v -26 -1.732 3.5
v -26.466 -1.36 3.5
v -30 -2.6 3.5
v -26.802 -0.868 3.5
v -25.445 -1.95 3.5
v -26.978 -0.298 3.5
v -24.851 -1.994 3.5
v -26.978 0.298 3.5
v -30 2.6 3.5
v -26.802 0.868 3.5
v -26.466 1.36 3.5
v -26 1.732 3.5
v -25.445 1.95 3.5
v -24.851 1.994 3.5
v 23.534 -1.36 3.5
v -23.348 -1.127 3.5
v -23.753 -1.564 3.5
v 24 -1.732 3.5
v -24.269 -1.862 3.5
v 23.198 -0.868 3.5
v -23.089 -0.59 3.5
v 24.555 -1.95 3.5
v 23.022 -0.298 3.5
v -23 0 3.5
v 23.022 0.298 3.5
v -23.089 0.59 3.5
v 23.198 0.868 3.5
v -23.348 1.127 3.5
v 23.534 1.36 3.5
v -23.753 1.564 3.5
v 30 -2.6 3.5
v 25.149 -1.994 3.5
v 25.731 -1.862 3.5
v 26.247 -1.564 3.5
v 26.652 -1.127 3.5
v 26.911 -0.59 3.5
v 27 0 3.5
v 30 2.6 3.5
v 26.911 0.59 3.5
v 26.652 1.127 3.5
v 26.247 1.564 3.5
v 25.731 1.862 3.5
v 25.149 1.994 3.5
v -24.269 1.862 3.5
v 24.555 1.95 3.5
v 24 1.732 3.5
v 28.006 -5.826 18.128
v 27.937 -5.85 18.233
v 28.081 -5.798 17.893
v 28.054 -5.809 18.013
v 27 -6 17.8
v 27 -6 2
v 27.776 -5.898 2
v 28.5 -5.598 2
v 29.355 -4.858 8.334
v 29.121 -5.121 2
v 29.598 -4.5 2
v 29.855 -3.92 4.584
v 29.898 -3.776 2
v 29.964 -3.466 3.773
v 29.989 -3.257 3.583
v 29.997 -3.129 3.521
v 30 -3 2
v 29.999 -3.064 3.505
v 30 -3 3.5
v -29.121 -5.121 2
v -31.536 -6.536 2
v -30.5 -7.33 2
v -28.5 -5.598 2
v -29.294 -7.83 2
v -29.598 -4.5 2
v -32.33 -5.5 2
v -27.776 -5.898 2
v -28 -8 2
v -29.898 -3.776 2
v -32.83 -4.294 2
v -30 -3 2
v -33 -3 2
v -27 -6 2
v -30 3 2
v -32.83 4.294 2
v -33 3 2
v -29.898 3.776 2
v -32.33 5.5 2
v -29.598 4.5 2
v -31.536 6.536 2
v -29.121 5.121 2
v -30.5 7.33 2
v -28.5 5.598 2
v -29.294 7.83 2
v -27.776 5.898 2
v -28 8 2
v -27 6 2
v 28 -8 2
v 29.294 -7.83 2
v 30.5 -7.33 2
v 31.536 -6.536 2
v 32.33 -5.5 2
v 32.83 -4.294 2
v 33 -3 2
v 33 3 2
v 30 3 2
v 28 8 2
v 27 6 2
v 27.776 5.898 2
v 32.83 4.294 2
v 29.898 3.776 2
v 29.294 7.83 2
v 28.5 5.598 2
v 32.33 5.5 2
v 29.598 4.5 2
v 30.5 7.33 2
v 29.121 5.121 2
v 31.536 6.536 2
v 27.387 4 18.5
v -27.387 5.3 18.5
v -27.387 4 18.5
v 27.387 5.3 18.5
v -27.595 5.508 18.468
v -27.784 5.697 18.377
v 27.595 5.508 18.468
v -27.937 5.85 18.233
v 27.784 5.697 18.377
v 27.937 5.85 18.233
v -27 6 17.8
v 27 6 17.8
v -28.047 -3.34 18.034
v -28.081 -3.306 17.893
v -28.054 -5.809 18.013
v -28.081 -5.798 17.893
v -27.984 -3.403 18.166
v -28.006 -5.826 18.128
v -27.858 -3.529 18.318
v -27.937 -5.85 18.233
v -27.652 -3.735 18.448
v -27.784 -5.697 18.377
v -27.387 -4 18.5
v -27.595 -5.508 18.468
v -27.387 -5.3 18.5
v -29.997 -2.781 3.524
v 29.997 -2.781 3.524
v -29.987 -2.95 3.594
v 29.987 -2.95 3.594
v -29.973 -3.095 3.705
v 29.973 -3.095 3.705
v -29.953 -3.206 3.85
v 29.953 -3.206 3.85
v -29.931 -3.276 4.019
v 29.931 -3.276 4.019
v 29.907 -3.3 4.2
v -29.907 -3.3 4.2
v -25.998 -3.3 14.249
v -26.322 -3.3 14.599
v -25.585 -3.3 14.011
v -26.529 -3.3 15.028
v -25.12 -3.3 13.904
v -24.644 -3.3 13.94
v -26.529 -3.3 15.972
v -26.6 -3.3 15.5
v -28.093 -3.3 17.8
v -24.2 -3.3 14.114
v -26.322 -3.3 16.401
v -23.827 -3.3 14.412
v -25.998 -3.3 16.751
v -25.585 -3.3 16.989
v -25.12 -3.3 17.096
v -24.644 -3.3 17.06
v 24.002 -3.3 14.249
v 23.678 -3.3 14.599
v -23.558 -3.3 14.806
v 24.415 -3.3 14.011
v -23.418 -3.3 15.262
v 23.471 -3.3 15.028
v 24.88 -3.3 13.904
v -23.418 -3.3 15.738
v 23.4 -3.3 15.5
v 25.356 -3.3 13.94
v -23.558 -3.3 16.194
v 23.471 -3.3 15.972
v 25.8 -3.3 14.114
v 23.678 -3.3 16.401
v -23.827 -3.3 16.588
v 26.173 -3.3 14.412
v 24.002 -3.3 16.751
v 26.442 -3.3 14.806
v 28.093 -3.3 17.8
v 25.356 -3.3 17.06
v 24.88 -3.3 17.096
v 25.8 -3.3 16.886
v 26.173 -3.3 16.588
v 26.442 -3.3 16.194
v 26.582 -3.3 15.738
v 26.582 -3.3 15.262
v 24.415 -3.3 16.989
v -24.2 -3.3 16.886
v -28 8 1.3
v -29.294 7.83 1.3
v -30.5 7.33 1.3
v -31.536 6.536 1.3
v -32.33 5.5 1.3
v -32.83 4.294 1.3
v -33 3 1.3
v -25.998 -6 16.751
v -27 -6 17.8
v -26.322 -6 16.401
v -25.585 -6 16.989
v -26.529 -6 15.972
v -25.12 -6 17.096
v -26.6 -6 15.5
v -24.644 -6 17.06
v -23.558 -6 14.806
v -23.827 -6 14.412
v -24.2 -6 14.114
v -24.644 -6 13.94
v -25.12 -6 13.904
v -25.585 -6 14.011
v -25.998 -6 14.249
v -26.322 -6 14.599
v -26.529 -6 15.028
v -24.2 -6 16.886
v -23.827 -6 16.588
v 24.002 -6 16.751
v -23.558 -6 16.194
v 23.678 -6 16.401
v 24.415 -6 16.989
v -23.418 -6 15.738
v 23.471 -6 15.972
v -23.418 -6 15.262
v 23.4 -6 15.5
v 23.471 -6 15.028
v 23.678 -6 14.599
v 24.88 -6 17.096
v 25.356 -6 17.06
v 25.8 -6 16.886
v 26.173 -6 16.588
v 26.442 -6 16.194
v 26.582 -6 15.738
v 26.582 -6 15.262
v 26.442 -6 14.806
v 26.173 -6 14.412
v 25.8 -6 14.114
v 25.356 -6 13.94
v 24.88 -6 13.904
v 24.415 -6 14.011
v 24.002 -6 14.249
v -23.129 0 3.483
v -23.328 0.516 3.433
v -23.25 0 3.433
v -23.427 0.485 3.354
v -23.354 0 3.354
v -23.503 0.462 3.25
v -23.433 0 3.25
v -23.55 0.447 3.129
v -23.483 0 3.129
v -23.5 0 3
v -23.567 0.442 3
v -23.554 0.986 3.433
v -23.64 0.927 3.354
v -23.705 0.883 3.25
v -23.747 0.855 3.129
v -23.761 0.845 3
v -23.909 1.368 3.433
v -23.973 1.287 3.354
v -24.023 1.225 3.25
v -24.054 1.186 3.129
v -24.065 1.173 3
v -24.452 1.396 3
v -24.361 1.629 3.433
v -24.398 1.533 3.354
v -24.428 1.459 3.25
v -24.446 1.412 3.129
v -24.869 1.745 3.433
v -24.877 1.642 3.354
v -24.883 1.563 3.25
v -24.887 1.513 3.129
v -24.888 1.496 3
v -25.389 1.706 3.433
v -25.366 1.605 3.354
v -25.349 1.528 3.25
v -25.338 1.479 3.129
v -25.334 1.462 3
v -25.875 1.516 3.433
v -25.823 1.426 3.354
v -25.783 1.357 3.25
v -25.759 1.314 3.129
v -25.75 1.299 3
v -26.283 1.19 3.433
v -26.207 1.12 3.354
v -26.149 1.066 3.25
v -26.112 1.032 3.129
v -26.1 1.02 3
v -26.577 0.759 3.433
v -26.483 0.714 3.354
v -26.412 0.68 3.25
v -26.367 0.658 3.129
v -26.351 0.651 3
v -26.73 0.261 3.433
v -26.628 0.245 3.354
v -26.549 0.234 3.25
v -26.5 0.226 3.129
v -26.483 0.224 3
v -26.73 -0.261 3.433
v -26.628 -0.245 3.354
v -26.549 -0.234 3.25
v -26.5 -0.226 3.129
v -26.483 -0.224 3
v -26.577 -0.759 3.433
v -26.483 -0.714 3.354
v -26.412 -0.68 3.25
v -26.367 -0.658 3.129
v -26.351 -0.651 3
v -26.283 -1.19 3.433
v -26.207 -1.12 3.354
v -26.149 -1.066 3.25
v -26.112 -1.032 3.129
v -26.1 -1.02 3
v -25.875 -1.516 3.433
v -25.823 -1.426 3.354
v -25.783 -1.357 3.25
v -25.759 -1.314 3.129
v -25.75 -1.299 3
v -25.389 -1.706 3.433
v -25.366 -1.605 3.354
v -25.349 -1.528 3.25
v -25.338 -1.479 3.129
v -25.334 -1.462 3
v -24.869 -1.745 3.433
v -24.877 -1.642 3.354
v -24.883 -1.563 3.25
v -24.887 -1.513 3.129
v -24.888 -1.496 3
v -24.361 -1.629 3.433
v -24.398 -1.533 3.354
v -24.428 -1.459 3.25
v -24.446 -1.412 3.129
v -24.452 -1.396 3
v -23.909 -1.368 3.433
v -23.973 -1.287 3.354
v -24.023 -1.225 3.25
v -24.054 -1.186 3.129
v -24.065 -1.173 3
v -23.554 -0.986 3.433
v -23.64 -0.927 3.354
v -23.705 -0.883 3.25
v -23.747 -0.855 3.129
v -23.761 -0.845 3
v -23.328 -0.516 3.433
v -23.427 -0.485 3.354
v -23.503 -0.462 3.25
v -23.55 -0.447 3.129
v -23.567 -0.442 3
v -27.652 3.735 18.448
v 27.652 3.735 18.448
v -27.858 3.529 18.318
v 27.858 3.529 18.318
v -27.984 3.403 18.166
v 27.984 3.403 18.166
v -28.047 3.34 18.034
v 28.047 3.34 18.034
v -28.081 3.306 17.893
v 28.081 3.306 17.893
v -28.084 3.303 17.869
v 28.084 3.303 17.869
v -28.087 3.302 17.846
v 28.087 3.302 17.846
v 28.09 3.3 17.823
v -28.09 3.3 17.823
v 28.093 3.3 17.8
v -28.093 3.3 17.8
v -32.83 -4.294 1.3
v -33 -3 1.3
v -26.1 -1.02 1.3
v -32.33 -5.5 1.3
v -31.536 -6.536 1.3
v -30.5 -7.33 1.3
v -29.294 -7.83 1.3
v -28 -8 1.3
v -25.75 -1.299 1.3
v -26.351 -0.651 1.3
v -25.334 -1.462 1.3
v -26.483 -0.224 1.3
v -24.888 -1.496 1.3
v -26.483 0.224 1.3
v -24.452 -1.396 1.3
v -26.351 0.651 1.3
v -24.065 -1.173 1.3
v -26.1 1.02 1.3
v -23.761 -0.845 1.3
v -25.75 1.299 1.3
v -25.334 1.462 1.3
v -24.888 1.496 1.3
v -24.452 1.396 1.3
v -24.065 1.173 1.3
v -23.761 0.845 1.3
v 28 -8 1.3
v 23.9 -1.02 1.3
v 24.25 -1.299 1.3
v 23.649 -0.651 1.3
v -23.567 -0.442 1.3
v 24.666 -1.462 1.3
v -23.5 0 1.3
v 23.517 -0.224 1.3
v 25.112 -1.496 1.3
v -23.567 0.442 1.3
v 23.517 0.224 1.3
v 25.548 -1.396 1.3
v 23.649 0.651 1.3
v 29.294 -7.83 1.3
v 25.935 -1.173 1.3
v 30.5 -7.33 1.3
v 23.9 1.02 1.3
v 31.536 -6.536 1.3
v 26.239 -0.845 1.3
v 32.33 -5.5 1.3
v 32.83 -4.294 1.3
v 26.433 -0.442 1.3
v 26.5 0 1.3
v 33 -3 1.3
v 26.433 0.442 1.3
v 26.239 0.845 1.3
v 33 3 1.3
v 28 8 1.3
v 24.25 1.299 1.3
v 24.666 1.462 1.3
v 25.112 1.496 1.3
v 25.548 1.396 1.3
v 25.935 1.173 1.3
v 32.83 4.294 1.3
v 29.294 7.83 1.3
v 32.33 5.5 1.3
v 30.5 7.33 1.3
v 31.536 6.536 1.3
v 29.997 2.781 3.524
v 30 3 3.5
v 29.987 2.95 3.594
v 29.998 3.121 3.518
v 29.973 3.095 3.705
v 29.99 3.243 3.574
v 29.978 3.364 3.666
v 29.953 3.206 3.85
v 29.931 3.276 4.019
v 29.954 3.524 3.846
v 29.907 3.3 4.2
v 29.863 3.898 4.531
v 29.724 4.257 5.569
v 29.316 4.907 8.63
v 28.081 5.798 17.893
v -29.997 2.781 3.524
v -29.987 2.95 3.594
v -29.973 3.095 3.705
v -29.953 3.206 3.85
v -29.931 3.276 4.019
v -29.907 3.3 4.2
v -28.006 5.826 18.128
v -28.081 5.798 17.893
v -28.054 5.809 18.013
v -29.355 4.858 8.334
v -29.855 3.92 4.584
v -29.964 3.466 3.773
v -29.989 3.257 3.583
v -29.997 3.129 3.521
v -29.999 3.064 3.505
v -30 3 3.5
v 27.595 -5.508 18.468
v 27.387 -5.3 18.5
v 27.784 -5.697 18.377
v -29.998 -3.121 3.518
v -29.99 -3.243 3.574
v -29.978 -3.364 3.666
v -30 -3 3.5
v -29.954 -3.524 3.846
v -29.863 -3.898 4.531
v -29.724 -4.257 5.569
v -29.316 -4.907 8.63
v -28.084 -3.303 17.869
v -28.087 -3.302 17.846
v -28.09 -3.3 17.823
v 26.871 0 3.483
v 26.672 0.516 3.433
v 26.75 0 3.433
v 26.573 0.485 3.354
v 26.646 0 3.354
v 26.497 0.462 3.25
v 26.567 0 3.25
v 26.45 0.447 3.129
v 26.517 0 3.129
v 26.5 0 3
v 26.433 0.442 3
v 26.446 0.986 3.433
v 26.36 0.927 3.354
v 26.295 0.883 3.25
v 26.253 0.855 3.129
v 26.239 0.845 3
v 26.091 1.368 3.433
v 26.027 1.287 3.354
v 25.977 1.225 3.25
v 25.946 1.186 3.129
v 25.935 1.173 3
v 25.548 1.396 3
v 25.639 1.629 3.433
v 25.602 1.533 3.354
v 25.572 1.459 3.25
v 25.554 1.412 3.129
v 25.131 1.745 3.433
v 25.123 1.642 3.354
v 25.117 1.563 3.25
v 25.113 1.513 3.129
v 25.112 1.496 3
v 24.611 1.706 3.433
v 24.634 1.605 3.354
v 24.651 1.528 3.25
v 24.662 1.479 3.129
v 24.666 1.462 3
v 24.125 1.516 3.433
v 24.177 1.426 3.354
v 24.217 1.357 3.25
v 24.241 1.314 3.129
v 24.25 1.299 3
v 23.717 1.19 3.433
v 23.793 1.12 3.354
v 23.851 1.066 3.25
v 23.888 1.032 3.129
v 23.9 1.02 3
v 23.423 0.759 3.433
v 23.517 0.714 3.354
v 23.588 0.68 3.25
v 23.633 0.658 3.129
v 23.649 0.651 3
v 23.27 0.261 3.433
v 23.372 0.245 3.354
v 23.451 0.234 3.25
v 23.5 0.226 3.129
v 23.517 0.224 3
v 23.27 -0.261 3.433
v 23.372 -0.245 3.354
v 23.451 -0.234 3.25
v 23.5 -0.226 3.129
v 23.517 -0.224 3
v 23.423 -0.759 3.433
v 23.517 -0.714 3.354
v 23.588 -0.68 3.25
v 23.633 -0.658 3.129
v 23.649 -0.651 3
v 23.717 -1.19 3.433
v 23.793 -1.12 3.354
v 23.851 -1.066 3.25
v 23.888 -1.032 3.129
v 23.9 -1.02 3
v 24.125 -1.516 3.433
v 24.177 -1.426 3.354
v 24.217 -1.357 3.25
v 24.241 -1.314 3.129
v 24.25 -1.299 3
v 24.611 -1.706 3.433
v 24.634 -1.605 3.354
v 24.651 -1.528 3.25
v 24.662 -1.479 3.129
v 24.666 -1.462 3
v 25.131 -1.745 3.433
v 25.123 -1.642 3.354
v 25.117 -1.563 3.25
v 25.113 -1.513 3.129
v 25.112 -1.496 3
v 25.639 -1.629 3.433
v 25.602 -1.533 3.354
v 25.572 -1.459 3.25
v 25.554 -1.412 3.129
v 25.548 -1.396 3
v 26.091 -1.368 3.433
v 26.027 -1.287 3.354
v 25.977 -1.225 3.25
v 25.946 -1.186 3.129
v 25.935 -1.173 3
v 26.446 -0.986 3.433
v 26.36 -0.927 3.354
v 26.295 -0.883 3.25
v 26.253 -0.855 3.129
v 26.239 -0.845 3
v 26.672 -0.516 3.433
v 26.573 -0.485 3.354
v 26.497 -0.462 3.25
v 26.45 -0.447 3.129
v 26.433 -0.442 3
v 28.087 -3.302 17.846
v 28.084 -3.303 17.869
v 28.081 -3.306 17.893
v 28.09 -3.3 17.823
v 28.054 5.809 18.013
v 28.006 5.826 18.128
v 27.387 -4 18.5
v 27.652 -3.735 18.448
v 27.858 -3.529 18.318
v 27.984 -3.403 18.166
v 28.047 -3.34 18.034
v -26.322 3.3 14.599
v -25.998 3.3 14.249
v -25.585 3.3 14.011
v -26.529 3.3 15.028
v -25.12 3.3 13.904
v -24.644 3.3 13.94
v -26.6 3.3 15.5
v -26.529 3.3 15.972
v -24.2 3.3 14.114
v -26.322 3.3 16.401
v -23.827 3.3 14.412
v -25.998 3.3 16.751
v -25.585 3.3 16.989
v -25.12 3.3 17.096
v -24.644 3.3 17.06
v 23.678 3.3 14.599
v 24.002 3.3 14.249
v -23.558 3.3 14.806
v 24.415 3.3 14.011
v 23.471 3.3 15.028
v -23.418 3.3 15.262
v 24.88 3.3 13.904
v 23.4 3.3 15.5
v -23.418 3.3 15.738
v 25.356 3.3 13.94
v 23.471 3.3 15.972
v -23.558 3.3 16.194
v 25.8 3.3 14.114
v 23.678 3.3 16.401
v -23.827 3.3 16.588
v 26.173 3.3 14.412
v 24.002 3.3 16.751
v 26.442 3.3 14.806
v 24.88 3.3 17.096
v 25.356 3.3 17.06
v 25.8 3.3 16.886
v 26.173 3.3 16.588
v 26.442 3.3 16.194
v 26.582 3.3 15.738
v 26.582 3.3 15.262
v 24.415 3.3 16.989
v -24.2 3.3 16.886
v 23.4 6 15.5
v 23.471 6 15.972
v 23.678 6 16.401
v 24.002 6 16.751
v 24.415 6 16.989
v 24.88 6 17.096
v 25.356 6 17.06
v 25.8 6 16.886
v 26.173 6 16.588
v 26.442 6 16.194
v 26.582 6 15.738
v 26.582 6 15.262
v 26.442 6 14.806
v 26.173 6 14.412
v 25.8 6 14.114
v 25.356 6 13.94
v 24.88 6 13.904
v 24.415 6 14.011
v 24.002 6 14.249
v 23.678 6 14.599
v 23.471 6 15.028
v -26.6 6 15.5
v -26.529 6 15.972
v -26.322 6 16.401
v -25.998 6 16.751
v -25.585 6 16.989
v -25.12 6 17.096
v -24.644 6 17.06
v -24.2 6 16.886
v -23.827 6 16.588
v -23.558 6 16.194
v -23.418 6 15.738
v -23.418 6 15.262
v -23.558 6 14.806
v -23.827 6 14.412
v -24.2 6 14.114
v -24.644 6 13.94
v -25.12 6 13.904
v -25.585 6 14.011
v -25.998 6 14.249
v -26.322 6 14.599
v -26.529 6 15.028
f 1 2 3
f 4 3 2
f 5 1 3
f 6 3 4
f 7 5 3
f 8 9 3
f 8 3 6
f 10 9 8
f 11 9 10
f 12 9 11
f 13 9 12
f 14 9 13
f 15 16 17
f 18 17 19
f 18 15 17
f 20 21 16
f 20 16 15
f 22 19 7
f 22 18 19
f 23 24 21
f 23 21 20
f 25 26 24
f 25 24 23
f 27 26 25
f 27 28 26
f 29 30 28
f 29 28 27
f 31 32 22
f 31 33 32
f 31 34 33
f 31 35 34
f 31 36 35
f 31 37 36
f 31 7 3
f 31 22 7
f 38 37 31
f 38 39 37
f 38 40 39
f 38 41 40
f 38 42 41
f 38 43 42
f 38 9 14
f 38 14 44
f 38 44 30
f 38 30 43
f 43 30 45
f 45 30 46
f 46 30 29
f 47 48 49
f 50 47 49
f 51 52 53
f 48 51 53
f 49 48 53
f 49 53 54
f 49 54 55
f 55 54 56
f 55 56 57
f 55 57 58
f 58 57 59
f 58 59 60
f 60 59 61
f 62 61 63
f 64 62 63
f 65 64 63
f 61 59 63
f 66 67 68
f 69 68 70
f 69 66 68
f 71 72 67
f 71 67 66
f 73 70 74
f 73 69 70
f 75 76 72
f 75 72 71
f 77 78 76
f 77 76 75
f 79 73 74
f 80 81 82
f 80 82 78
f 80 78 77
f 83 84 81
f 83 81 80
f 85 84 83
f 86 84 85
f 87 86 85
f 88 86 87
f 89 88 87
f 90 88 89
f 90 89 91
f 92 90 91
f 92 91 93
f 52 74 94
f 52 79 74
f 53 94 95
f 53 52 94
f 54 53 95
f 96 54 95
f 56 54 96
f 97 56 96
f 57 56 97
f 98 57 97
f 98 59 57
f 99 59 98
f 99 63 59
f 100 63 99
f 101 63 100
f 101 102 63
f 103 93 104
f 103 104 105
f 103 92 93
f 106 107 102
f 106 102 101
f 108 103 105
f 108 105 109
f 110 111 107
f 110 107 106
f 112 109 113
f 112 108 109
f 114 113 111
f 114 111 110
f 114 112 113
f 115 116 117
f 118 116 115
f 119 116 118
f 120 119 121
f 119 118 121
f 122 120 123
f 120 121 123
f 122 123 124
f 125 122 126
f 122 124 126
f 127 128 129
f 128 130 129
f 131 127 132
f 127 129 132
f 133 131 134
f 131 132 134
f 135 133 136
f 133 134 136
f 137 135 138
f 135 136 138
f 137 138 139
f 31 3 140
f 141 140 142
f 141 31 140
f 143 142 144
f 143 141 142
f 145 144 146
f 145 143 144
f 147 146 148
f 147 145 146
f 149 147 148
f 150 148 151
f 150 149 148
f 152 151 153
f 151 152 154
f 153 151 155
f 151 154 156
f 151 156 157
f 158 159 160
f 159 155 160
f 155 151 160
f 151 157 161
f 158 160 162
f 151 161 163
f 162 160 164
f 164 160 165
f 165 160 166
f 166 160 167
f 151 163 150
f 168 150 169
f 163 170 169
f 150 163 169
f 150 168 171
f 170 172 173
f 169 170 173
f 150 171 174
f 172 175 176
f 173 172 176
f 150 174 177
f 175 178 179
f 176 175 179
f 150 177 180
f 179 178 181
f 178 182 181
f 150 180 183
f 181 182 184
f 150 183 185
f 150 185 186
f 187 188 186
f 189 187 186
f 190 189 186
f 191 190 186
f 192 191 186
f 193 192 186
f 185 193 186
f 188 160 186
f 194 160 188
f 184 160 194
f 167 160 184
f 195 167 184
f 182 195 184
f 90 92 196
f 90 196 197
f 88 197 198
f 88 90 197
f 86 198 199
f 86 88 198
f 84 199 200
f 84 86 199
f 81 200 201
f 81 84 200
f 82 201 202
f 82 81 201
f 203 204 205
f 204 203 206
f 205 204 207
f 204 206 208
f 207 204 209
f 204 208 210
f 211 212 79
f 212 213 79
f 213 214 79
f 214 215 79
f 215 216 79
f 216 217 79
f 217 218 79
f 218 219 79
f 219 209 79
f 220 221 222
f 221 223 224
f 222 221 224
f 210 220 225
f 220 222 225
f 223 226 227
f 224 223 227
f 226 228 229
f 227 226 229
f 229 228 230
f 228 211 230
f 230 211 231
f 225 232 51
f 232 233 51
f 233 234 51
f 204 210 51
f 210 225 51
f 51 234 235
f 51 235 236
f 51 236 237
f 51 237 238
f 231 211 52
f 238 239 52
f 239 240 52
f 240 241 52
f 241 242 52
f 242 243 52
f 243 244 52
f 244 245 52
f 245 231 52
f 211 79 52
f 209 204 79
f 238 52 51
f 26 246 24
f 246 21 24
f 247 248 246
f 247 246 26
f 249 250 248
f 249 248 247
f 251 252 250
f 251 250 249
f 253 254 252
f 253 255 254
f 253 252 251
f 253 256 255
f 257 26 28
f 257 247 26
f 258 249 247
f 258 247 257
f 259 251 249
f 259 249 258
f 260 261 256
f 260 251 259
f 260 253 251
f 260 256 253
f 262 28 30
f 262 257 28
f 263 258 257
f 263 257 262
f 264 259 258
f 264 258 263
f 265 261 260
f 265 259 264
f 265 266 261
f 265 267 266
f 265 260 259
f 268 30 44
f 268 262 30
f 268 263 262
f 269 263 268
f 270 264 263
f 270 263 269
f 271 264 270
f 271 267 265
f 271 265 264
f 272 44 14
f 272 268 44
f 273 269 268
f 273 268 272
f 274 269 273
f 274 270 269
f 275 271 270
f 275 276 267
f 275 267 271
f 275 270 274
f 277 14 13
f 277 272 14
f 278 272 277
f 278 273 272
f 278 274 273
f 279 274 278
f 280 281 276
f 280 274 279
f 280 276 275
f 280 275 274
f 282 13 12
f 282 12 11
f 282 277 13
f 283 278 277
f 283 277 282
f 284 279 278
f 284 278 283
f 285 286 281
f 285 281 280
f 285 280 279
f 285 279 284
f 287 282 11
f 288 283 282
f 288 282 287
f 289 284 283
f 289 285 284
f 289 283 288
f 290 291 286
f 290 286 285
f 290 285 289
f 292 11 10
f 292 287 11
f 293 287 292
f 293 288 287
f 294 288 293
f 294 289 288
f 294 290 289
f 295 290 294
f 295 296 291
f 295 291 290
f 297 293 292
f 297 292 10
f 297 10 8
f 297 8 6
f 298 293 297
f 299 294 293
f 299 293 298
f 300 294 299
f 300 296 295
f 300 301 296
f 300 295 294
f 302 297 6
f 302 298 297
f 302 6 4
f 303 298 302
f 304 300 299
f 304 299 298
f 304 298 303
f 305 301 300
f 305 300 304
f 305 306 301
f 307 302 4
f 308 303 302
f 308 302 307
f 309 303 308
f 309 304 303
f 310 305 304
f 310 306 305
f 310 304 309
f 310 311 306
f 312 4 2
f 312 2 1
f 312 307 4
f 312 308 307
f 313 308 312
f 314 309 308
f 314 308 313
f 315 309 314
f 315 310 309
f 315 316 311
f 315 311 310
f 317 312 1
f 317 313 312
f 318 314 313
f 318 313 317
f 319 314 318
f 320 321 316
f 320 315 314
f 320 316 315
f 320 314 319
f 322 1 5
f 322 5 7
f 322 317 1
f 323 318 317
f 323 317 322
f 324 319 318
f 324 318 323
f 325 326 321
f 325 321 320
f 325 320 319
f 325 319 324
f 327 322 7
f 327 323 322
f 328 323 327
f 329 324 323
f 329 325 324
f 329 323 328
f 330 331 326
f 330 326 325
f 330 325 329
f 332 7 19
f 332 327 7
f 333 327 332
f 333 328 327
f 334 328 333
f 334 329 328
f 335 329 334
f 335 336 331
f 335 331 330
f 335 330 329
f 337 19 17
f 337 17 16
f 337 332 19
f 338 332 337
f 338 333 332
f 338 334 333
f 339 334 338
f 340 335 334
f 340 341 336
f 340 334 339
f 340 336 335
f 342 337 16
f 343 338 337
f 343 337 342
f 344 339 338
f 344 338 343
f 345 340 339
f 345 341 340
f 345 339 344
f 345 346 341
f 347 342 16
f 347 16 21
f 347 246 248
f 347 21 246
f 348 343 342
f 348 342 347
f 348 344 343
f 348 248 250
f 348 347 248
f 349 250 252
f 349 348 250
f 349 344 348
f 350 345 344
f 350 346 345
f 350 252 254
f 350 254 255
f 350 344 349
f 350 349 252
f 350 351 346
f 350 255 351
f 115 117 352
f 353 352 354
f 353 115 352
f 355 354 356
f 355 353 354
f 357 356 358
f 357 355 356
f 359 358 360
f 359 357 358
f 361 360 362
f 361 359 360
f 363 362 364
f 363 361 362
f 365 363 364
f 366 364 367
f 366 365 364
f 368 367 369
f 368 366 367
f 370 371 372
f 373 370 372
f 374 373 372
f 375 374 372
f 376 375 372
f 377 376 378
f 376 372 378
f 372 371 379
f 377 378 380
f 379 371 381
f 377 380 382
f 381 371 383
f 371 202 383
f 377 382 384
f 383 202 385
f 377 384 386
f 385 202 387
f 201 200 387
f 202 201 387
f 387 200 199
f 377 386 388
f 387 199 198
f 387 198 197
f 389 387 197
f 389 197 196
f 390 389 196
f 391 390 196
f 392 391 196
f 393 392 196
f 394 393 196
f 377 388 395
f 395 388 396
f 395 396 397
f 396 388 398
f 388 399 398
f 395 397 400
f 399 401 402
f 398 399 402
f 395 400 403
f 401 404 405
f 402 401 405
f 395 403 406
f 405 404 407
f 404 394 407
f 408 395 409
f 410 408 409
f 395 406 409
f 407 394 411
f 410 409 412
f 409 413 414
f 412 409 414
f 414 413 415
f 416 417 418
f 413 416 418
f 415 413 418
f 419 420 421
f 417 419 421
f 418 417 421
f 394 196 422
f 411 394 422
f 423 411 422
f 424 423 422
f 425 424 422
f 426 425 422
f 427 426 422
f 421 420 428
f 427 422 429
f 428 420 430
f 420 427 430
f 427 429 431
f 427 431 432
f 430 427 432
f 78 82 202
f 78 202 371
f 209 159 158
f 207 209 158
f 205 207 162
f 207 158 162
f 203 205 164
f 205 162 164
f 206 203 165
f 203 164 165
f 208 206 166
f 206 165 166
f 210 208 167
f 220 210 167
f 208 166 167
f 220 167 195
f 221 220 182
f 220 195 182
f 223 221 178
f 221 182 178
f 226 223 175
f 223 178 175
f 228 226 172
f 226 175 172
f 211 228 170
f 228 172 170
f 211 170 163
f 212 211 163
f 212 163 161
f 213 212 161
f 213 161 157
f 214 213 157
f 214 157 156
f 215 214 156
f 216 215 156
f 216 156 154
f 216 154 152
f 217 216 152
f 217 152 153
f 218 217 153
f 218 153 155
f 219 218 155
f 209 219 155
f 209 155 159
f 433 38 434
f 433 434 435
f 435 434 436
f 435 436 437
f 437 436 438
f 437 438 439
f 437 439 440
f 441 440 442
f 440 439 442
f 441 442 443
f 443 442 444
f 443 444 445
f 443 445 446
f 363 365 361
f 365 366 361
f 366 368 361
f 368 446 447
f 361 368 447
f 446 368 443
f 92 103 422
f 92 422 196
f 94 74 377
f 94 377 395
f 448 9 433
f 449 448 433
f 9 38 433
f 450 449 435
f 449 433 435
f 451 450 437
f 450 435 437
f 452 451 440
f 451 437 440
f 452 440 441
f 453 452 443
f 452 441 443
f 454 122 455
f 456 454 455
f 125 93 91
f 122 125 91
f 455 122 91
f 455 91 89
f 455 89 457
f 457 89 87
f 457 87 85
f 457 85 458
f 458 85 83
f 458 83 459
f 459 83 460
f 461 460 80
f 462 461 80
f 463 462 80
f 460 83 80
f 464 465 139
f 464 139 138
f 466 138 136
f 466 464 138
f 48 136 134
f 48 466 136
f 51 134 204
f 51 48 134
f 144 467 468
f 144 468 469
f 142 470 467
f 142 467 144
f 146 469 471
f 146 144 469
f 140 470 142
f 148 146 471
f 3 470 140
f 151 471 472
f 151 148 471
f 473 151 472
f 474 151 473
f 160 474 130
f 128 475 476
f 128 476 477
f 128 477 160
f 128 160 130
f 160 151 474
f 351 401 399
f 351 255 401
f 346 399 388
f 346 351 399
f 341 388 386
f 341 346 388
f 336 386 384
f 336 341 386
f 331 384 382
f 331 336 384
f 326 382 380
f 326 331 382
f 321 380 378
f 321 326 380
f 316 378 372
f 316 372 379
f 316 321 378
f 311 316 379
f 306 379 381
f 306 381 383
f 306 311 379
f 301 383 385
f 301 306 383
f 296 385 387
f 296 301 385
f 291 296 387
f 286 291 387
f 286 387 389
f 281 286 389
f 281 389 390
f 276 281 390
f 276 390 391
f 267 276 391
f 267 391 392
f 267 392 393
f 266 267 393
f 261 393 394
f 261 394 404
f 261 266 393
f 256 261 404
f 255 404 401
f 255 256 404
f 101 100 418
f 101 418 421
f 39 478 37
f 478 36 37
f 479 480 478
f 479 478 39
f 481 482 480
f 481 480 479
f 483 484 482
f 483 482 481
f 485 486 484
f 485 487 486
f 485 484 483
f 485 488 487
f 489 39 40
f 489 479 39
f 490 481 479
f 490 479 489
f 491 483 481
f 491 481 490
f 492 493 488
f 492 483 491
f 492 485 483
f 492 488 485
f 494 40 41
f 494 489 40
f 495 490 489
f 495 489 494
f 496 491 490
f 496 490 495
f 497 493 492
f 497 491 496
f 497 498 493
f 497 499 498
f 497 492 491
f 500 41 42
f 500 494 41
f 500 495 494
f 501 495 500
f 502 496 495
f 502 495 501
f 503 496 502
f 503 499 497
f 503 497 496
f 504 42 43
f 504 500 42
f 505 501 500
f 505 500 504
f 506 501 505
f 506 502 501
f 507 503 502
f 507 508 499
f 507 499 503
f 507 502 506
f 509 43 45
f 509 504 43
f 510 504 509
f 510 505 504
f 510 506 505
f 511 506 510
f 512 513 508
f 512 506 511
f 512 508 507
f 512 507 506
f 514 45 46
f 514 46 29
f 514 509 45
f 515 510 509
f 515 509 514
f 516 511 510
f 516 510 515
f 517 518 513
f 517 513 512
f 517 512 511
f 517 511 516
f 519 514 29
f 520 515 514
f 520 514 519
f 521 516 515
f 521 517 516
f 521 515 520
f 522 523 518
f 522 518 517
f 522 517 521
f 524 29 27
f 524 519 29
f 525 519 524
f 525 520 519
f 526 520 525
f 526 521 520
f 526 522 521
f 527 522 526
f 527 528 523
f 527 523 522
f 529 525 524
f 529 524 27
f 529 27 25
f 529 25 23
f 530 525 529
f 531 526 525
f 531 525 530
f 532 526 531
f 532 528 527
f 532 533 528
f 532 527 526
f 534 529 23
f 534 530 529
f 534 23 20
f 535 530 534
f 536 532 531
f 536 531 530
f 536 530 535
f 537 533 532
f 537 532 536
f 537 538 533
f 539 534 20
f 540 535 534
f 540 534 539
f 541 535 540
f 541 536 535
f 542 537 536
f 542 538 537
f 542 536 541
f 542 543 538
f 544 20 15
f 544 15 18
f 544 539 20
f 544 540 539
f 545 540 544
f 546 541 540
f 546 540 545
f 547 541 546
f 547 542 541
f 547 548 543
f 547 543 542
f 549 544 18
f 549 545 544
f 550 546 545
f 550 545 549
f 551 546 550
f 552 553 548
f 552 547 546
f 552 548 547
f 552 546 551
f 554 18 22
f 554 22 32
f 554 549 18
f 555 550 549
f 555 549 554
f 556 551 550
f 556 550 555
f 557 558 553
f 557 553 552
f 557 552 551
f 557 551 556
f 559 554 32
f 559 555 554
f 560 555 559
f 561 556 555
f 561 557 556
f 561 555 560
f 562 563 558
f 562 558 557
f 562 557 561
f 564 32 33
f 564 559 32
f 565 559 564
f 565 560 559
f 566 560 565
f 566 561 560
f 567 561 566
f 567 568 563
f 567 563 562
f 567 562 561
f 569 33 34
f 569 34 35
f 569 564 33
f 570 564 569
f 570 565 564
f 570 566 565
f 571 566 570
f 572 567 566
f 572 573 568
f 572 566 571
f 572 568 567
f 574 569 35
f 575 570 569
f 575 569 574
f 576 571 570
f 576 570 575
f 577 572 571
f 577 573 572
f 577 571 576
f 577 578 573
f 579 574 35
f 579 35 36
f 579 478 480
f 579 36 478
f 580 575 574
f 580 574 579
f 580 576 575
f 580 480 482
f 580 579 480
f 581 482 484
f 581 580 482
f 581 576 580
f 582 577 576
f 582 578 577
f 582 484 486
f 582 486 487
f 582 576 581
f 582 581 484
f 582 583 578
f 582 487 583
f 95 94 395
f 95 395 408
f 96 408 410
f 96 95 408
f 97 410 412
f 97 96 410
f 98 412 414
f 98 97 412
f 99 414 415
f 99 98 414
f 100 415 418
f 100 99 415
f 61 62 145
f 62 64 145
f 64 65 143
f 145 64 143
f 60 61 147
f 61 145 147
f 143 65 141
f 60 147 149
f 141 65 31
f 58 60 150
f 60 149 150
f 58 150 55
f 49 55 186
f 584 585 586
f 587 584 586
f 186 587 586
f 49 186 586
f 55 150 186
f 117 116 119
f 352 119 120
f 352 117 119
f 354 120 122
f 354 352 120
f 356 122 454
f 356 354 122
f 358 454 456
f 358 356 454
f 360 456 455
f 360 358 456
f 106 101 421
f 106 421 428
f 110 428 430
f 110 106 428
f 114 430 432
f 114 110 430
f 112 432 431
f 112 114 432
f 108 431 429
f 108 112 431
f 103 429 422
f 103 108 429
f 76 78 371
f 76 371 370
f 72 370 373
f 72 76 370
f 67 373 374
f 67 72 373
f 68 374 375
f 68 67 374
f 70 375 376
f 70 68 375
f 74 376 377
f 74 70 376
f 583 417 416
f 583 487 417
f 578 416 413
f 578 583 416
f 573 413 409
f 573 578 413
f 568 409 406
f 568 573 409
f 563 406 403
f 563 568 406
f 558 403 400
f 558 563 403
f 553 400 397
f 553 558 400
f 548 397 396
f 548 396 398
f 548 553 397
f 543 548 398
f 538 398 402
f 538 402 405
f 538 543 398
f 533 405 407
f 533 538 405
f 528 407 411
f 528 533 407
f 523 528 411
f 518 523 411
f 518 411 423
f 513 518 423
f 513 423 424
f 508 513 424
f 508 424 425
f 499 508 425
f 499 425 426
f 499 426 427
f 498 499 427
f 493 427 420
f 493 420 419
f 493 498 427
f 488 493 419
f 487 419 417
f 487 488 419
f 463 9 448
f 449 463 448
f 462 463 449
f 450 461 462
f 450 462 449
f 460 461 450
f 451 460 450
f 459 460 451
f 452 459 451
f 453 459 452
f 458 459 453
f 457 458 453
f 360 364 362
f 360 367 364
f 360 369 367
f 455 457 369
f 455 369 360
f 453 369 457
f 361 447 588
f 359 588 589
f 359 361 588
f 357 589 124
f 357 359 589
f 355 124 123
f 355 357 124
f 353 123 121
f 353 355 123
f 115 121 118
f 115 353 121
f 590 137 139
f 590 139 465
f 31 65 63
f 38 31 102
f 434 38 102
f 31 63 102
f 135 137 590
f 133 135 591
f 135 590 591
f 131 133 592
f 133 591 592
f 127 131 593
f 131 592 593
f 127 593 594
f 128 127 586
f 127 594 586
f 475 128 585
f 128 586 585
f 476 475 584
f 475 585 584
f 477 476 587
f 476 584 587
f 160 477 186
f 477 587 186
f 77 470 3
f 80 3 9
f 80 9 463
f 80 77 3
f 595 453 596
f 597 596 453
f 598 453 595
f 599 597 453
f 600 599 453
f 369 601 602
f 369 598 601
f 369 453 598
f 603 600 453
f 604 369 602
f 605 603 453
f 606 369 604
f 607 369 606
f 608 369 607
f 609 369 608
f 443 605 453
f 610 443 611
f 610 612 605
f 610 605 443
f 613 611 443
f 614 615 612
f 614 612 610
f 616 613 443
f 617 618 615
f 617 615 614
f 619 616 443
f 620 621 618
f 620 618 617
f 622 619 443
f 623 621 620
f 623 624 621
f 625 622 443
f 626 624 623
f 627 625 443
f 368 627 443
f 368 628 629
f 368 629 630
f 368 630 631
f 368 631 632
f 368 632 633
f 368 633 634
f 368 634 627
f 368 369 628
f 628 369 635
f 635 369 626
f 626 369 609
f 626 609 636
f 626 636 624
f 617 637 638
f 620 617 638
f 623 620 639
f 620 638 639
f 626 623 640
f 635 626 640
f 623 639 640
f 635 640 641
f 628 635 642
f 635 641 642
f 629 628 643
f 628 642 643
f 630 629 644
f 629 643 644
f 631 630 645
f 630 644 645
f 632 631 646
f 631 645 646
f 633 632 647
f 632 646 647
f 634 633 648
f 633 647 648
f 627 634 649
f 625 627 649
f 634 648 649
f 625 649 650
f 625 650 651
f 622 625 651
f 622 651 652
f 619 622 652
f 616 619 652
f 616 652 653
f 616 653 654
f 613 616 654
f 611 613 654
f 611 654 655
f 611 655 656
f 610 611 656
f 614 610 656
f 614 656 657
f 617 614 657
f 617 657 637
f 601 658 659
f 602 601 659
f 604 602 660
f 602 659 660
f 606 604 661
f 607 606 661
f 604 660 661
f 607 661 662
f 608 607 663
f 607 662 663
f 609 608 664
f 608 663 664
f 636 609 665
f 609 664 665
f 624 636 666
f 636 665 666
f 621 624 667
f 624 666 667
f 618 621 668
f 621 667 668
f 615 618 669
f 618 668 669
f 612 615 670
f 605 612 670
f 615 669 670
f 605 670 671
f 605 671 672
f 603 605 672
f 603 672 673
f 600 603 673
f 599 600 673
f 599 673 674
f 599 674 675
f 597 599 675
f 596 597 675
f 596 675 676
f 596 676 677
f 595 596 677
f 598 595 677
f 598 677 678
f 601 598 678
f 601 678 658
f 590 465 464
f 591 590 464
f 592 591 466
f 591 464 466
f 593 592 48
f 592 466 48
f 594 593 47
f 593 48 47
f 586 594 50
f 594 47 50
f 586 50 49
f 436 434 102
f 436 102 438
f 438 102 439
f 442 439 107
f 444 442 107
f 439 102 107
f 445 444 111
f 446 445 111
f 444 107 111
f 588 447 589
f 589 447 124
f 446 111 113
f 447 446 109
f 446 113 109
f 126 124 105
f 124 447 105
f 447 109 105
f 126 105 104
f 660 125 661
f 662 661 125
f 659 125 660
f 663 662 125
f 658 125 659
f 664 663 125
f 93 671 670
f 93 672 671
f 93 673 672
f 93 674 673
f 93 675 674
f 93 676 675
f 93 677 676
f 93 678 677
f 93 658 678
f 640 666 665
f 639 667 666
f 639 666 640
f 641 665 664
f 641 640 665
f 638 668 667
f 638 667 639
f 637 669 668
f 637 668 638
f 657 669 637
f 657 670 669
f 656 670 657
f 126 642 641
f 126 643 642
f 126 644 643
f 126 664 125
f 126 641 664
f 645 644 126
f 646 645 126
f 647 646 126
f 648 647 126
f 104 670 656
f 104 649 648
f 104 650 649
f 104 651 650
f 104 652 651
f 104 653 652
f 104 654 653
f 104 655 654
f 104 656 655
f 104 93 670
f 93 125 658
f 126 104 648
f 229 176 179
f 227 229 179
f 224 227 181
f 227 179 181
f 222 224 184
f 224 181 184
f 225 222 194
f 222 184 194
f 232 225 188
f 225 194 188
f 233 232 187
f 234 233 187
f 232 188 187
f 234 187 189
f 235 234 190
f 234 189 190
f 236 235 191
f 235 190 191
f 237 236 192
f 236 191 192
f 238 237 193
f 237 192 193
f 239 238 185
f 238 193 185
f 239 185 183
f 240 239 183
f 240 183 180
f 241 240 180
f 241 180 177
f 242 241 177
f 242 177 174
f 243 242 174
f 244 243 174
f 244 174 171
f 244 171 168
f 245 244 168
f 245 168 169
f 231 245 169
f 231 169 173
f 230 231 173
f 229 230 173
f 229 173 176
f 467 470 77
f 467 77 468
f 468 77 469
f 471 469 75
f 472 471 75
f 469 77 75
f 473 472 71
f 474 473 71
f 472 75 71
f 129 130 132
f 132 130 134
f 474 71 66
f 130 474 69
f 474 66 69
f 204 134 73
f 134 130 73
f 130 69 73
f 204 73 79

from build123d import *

# Parameters (mm, degrees)
SKETCH1_W           = 60
SKETCH1_H           = 12
BOSS_EXTRUDE1_DEPTH = 18.5
SKETCH2_W           = 65
SKETCH2_H           = 6.6
CUT_EXTRUDE1_DEPTH  = 15
SKETCH3_R           = 1.6
CUT_EXTRUDE2_DEPTH  = 38.232378382
CUT_EXTRUDE3_DEPTH  = 37.451886097
FILLET1_R           = 0.7
FILLET3_R           = 0.7
FILLET4_R           = 3
SKETCH5_R           = 1.5
CUT_EXTRUDE4_DEPTH  = 35.073450224
FILLET5_R           = 0.5
SKETCH6_W           = 73.746826028
SKETCH6_H           = 28.597179554
CUT_EXTRUDE5_DEPTH  = 2
SKETCH8_R           = 1.5
BOSS_EXTRUDE2_DEPTH = 0.7


with BuildPart() as part:
    # Sketch1 → Boss-Extrude1 (new body)
    with BuildSketch(Plane.XY):
        Rectangle(SKETCH1_W, SKETCH1_H)
    extrude(amount=BOSS_EXTRUDE1_DEPTH)

    # Sketch2 → Cut-Extrude1 (cut)
    with BuildSketch(Plane.XY.offset(18.5)):
        Rectangle(SKETCH2_W, SKETCH2_H)
    extrude(amount=-CUT_EXTRUDE1_DEPTH, mode=Mode.SUBTRACT)

    # Sketch3 → Cut-Extrude2 (cut, through all)
    with BuildSketch(Plane(origin=(0, 6, 0), x_dir=(1, 0, 0), z_dir=(0, 1, 0))):
        with Locations(Location((25, -15.5, 0), (0, 0, 180))):
            Circle(SKETCH3_R)
        with Locations(Location((-25, -15.5, 0), (0, 0, 180))):
            Circle(SKETCH3_R)
    extrude(amount=-CUT_EXTRUDE2_DEPTH, mode=Mode.SUBTRACT)

    # Sketch4 → Cut-Extrude3 (cut, symmetric)
    with BuildSketch(Plane(origin=(0, -3.3, 0), x_dir=(1, 0, 0), z_dir=(0, 1, 0))):
        Polygon((-30, -3.5), (-28, -18.5), (-30, -18.5), align=None)
    cut_extrude3 = extrude(amount=CUT_EXTRUDE3_DEPTH, both=True, mode=Mode.SUBTRACT)

    # Mirror1: Cut-Extrude3 across plane
    add(cut_extrude3.mirror(Plane(origin=(0, 0, 0), x_dir=(0, 0, 1), z_dir=(1, 0, 0))), mode=Mode.SUBTRACT)

    # Fillet1
    fillet1_edges = [part.edges().sort_by_distance(p)[0] for p in [
        (0, 3.3, 3.5),
        (0, -3.3, 3.5),
    ]]
    fillet(fillet1_edges, radius=FILLET1_R)

    # Fillet3
    fillet3_edges = [part.edges().sort_by_distance(p)[0] for p in [
        (0, -3.3, 18.5),
        (0, -6, 18.5),
        (-28, 4.65, 18.5),
        (-28, -4.65, 18.5),
        (0, 3.3, 18.5),
        (0, 6, 18.5),
        (28, 4.65, 18.5),
        (28, -4.65, 18.5),
    ]]
    fillet(fillet3_edges, radius=FILLET3_R)

    # Fillet4
    # the kernel refuses this fillet: 3 mm, written as the material it takes off along each edge
    with BuildSketch(Plane(origin=(30, -6, -18), x_dir=(-1, 0, 0), z_dir=(0, 0, 1)), Plane(origin=(-30, -6, -18), x_dir=(0, 1, 0), z_dir=(0, 0, 1))) as fillet4_piece_1:
        with BuildLine():
            CenterArc((FILLET4_R, -FILLET4_R), FILLET4_R, 90, 90)
            Line((0, -FILLET4_R), (-FILLET4_R * 0.02, -FILLET4_R))
            Line((-FILLET4_R * 0.02, -FILLET4_R), (-FILLET4_R * 0.02, FILLET4_R * 0.02))
            Line((-FILLET4_R * 0.02, FILLET4_R * 0.02), (FILLET4_R, FILLET4_R * 0.02))
            Line((FILLET4_R, FILLET4_R * 0.02), (FILLET4_R, 0))
        make_face()
    extrude(amount=39.5, mode=Mode.SUBTRACT)
    with BuildSketch(Plane(origin=(30, 6, -18), x_dir=(-1, 0, 0), z_dir=(0, 0, 1)), Plane(origin=(-30, 6, -18), x_dir=(0, -1, 0), z_dir=(0, 0, 1))) as fillet4_piece_2:
        with BuildLine():
            CenterArc((FILLET4_R, FILLET4_R), FILLET4_R, 180, 90)
            Line((0, FILLET4_R), (-FILLET4_R * 0.02, FILLET4_R))
            Line((-FILLET4_R * 0.02, FILLET4_R), (-FILLET4_R * 0.02, -FILLET4_R * 0.02))
            Line((-FILLET4_R * 0.02, -FILLET4_R * 0.02), (FILLET4_R, -FILLET4_R * 0.02))
            Line((FILLET4_R, -FILLET4_R * 0.02), (FILLET4_R, 0))
        make_face()
    extrude(amount=39.5, mode=Mode.SUBTRACT)

    # Sketch5 → Cut-Extrude4 (cut, through all)
    with BuildSketch(Plane.XY.offset(3.5)):
        with Locations((-25, 0)):
            Circle(SKETCH5_R)
        with Locations((25, 0)):
            Circle(SKETCH5_R)
    extrude(amount=-CUT_EXTRUDE4_DEPTH, mode=Mode.SUBTRACT)

    # Fillet5
    fillet5_edges = [part.edges().sort_by_distance(p)[0] for p in [
        (-26.5, 0, 3.5),
        (23.5, 0, 3.5),
    ]]
    fillet(fillet5_edges, radius=FILLET5_R)

    # Sketch6 → Cut-Extrude5 (cut)
    with BuildSketch(Plane.XY):
        Rectangle(SKETCH6_W, SKETCH6_H)
    extrude(amount=CUT_EXTRUDE5_DEPTH, mode=Mode.SUBTRACT)

    # Sketch8 → Boss-Extrude2 (add)
    with BuildSketch(Plane(origin=(0, 0, 2), x_dir=(-1, 0, 0), z_dir=(0, 0, -1))):
        with BuildLine():
            Line((28, -8), (-28, -8))
            ThreePointArc((-28, -8), (-31.535533906, -6.535533906), (-33, -3))
            Line((-33, -3), (-33, 3))
            ThreePointArc((-33, 3), (-31.535533906, 6.535533906), (-28, 8))
            Line((-28, 8), (28, 8))
            ThreePointArc((28, 8), (31.535533906, 6.535533906), (33, 3))
            Line((33, 3), (33, -3))
            ThreePointArc((33, -3), (31.535533906, -6.535533906), (28, -8))
        make_face()
        with Locations(Location((-25, 0, 0), (0, 0, 180))):
            Circle(SKETCH8_R, mode=Mode.SUBTRACT)
        with Locations(Location((25, 0, 0), (0, 0, 180))):
            Circle(SKETCH8_R, mode=Mode.SUBTRACT)
    extrude(amount=BOSS_EXTRUDE2_DEPTH)


solid = part.part
